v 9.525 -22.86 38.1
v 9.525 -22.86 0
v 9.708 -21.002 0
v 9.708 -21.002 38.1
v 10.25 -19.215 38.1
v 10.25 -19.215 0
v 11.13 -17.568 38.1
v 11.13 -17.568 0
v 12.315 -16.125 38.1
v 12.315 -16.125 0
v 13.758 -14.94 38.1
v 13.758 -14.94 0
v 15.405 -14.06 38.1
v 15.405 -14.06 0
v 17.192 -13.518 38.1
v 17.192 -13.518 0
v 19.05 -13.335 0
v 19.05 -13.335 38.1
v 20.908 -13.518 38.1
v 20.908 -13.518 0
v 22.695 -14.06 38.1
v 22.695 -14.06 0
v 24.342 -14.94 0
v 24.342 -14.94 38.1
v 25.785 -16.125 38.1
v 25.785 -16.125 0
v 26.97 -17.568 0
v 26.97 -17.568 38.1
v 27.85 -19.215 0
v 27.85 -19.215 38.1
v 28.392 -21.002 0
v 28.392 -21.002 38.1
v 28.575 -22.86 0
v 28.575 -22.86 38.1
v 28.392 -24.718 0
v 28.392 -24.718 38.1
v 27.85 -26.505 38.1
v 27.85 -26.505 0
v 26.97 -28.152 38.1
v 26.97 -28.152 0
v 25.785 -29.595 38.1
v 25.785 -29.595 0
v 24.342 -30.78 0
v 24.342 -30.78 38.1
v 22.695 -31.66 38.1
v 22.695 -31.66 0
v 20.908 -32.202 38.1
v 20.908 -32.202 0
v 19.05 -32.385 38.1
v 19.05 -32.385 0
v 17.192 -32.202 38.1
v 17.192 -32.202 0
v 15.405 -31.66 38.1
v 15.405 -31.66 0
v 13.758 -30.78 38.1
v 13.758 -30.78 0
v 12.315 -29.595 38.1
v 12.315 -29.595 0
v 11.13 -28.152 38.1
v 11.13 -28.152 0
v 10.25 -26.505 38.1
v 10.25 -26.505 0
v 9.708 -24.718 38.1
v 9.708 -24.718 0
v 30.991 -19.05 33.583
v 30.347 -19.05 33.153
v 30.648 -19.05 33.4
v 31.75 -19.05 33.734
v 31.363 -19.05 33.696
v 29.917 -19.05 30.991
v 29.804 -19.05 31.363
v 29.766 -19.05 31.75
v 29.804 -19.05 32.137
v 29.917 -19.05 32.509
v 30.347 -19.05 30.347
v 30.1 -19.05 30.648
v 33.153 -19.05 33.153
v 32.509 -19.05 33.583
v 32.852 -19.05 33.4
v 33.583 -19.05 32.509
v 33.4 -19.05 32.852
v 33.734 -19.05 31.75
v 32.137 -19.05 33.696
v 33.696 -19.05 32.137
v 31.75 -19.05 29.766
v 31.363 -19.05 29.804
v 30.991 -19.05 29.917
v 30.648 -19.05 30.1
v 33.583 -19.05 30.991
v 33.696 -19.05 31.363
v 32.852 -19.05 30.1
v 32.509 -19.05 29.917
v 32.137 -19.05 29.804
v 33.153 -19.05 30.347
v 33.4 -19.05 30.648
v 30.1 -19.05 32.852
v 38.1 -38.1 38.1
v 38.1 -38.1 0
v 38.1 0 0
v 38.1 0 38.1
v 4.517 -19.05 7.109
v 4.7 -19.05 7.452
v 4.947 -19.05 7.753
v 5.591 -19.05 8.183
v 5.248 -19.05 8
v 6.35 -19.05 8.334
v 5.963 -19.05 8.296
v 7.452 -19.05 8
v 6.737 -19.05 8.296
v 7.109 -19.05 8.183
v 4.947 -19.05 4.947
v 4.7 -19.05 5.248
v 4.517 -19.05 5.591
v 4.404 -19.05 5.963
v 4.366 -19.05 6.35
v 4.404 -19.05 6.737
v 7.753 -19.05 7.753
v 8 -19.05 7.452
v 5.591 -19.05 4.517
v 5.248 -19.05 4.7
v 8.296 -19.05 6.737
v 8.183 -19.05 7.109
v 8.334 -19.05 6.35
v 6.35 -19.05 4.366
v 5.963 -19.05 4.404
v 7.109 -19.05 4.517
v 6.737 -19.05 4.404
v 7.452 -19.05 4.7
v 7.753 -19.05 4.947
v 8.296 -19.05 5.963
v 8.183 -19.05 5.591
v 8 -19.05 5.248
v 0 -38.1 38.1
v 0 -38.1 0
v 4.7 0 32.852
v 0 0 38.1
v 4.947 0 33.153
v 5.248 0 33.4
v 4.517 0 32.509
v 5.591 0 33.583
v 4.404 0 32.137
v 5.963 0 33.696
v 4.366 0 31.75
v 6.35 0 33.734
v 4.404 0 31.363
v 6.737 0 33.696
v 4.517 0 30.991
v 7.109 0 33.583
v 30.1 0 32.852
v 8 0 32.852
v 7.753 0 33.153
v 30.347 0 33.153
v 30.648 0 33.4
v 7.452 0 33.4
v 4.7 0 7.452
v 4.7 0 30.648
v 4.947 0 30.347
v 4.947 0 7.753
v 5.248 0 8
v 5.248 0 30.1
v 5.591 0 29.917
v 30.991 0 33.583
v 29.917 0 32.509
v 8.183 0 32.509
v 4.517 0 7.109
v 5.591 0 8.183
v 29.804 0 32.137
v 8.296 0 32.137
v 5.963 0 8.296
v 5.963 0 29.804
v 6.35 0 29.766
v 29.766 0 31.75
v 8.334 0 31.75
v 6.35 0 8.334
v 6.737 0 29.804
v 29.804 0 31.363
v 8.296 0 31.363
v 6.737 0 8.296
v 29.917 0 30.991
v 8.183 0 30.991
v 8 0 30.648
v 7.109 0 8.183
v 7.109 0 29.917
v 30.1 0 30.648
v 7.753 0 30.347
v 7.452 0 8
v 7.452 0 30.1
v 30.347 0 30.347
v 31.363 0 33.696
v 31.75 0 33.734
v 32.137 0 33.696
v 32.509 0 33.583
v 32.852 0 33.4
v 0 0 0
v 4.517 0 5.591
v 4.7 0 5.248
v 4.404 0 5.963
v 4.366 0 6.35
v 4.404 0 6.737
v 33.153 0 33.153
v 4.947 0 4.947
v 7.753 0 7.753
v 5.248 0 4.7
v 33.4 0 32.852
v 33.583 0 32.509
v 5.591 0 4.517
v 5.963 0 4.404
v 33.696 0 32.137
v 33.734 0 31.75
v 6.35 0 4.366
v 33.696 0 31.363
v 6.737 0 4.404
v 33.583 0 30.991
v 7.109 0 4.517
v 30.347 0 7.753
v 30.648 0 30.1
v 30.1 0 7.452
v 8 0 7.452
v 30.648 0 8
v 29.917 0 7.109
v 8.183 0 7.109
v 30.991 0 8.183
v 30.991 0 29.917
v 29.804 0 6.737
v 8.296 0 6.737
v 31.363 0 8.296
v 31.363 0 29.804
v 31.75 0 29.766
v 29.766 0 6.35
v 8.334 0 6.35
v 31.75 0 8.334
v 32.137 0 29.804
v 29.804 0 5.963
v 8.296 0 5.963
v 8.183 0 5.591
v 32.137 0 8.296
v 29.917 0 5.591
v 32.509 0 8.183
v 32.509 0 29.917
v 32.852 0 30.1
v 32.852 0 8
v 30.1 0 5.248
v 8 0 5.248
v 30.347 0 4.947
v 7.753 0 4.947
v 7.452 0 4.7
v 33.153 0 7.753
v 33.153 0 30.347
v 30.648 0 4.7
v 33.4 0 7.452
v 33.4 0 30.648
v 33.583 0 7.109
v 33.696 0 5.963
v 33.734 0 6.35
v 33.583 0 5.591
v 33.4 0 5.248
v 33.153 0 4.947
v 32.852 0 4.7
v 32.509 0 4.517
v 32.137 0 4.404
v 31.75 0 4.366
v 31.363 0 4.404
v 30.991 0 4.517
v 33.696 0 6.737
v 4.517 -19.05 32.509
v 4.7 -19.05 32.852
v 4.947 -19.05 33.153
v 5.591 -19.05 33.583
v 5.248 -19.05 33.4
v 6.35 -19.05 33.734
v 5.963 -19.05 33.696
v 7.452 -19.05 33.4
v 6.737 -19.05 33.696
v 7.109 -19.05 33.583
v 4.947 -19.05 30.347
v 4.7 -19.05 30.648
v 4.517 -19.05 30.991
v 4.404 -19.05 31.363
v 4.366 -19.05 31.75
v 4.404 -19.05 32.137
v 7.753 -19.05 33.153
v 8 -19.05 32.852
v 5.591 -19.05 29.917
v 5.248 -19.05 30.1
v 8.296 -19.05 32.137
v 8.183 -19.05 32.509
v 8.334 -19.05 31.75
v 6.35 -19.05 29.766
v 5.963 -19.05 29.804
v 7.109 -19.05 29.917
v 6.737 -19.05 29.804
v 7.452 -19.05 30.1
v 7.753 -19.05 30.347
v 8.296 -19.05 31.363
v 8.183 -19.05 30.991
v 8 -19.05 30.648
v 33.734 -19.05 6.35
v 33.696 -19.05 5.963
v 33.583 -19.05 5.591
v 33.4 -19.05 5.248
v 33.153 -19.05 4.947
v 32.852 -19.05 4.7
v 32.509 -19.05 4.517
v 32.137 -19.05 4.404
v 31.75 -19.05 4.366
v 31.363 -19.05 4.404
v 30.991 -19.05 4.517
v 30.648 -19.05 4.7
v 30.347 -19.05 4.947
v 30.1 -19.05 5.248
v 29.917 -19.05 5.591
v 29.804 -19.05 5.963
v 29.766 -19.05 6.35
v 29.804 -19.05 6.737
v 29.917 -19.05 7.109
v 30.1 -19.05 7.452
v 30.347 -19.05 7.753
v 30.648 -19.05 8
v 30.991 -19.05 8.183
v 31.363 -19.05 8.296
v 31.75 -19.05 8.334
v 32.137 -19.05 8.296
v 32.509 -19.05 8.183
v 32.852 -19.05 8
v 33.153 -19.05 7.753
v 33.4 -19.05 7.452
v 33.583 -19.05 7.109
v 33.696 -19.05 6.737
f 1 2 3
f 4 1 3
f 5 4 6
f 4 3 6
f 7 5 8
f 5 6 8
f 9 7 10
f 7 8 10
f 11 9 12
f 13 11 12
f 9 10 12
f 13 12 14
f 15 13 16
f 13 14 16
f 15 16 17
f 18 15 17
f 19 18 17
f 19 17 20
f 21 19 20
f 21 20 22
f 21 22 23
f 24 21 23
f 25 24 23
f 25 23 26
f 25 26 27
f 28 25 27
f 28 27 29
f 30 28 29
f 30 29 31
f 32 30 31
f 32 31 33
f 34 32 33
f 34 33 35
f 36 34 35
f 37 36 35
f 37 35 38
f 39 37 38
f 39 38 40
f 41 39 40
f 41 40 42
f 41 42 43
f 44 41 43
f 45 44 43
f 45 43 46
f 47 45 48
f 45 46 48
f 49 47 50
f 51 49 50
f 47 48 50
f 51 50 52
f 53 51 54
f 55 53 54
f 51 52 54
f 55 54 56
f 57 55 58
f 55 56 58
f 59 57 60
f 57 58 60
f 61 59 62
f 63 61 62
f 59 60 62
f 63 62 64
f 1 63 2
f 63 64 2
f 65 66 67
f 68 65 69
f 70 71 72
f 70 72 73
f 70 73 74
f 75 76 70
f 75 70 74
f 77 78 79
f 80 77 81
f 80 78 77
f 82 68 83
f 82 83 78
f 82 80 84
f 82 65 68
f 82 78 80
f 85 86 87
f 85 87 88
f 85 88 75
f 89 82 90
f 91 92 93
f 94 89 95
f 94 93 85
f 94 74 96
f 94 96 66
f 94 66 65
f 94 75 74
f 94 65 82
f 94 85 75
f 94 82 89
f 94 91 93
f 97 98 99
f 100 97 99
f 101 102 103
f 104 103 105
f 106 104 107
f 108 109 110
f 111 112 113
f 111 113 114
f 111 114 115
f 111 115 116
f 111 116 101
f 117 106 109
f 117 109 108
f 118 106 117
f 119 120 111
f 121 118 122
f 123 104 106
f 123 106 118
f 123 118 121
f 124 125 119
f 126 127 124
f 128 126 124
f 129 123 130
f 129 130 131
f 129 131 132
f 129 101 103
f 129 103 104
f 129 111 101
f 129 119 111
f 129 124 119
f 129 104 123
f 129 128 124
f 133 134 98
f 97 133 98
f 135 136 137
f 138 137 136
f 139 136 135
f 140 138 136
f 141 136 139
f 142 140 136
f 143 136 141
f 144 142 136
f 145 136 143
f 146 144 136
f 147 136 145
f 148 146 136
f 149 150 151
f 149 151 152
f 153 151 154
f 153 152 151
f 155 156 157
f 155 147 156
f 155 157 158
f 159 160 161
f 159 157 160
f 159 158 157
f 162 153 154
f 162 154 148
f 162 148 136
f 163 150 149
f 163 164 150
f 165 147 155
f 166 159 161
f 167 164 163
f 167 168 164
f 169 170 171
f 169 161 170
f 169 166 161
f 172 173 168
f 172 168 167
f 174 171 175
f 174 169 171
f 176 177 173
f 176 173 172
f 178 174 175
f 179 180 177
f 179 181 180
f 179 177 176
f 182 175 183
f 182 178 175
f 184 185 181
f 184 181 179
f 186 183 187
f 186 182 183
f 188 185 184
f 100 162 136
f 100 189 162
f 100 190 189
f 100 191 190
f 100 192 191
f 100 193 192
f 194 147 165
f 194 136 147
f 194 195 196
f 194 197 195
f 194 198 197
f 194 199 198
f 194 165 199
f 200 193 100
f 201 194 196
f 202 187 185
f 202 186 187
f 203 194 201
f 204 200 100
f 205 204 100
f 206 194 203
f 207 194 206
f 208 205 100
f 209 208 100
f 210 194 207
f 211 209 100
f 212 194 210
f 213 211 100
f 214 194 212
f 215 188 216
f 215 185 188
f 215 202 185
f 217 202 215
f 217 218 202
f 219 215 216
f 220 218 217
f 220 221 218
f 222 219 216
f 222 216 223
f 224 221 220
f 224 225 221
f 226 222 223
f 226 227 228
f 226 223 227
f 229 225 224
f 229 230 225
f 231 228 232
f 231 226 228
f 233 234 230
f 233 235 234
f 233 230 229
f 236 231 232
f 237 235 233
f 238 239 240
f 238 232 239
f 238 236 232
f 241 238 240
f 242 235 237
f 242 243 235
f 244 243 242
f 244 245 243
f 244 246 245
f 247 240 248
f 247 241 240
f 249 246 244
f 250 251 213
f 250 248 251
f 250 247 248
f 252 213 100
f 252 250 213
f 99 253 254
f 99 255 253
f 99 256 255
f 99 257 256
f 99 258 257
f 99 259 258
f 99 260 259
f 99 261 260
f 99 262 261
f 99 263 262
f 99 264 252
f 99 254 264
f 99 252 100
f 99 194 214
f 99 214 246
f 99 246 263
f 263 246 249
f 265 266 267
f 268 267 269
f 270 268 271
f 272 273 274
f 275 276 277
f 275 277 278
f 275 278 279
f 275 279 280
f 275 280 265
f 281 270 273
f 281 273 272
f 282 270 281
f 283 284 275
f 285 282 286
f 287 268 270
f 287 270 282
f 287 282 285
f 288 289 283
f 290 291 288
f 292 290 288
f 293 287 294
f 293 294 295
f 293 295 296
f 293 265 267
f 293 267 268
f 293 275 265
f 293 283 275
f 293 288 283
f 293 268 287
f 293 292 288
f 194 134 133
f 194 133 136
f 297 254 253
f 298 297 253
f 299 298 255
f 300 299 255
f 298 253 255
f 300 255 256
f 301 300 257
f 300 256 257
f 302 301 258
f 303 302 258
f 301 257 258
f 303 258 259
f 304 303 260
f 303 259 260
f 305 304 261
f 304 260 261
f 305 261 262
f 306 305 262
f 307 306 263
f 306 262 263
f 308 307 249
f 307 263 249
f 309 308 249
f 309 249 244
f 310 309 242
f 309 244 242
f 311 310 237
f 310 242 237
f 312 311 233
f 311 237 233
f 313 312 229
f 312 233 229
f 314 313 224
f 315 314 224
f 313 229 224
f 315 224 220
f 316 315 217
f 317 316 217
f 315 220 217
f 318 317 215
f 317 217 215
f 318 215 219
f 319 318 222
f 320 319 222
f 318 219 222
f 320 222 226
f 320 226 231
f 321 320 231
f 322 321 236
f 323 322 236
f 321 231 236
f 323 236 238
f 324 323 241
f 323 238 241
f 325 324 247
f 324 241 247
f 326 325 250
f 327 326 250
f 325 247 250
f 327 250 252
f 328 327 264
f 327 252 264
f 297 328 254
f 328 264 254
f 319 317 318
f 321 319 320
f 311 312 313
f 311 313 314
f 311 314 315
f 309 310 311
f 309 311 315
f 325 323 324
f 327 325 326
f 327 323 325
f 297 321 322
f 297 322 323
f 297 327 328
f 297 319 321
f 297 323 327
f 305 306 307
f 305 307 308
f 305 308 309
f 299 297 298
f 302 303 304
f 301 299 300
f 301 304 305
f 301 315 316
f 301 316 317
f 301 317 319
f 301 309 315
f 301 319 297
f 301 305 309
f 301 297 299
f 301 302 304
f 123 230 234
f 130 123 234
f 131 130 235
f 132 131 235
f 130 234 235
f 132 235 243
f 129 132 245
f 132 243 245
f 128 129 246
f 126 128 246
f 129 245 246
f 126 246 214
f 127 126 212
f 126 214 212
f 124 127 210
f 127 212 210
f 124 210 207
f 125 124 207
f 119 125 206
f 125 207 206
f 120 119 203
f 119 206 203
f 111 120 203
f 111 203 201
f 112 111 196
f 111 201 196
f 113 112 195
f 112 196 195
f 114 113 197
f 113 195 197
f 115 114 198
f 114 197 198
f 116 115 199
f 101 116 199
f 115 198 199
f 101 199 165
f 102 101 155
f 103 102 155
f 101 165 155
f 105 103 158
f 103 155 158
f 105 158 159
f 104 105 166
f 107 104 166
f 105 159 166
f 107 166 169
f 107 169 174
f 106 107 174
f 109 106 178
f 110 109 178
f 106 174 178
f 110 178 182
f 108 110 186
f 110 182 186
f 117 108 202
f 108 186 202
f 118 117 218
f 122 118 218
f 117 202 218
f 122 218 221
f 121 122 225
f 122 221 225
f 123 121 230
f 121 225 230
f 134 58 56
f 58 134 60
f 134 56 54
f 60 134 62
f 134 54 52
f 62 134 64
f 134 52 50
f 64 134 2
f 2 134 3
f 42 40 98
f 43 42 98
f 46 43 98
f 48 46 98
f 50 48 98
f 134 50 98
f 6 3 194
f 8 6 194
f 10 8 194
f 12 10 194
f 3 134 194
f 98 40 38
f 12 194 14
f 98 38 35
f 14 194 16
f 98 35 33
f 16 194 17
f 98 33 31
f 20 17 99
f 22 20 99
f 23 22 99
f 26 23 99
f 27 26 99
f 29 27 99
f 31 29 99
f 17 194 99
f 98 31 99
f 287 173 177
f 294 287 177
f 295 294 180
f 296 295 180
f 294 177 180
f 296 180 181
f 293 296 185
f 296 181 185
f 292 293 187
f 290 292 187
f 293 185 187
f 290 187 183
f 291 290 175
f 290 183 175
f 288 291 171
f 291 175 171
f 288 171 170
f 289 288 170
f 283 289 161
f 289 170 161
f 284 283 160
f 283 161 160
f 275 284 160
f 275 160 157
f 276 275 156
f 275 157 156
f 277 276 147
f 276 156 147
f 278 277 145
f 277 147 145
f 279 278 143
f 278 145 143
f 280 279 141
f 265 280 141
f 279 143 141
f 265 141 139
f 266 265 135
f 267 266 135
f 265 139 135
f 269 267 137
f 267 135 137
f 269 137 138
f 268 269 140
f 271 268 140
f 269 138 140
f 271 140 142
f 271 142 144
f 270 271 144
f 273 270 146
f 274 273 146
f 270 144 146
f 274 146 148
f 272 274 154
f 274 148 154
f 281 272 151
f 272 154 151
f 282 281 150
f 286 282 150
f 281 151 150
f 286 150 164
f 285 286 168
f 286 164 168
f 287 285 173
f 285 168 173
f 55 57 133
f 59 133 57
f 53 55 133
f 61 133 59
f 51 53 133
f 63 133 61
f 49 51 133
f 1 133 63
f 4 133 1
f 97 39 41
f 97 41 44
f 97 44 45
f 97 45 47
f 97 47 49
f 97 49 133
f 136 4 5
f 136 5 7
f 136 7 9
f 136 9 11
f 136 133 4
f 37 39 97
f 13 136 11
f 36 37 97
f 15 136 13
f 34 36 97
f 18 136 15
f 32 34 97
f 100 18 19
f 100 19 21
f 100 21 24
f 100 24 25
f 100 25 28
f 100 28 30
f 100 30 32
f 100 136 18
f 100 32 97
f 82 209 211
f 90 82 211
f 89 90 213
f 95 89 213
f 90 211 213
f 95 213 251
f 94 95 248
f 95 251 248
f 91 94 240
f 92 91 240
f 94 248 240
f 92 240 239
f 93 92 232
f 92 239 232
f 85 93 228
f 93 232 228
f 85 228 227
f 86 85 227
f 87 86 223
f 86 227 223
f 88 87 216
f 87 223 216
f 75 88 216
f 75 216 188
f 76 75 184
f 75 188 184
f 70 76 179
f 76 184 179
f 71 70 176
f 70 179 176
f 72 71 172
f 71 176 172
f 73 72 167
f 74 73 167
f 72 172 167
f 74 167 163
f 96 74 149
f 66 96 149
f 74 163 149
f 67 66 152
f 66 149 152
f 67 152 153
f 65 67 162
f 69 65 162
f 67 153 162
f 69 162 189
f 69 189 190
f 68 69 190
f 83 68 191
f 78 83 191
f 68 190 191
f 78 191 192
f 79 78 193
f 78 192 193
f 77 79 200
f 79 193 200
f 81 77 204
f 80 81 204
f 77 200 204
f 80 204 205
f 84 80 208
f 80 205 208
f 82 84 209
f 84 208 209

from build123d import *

# Parameters (mm, degrees)
SKETCH1_W                   = 38.1
SKETCH1_H                   = 38.1
BOSS_EXTRUDE1_DEPTH         = 38.1
SKETCH4_R                   = 1.984375
CUT_EXTRUDE2_DEPTH          = 19.05
F_3_4_0_75_DIAMETER_HOLE1_D = 19.05


with BuildPart() as part:
    # Sketch1 → Boss-Extrude1 (new body)
    with BuildSketch(Plane.XY):
        with Locations((19.05, -19.05)):
            Rectangle(SKETCH1_W, SKETCH1_H)
    extrude(amount=BOSS_EXTRUDE1_DEPTH)

    # Sketch4 → Cut-Extrude2 (cut)
    with BuildSketch(Plane(origin=(0, 0, 0), x_dir=(1, 0, 0), z_dir=(0, 1, 0))):
        with Locations((6.35, -6.35)):
            Circle(SKETCH4_R)
        with Locations((6.35, -31.75)):
            Circle(SKETCH4_R)
        with Locations((31.75, -6.35)):
            Circle(SKETCH4_R)
        with Locations((31.75, -31.75)):
            Circle(SKETCH4_R)
    extrude(amount=-CUT_EXTRUDE2_DEPTH, mode=Mode.SUBTRACT)

    # 3/4 (0.75) Diameter Hole1 (through all)
    with Locations(Plane.XY.offset(38.1)):
        with Locations((19.05, -22.86)):
            Hole(F_3_4_0_75_DIAMETER_HOLE1_D / 2)


solid = part.part
